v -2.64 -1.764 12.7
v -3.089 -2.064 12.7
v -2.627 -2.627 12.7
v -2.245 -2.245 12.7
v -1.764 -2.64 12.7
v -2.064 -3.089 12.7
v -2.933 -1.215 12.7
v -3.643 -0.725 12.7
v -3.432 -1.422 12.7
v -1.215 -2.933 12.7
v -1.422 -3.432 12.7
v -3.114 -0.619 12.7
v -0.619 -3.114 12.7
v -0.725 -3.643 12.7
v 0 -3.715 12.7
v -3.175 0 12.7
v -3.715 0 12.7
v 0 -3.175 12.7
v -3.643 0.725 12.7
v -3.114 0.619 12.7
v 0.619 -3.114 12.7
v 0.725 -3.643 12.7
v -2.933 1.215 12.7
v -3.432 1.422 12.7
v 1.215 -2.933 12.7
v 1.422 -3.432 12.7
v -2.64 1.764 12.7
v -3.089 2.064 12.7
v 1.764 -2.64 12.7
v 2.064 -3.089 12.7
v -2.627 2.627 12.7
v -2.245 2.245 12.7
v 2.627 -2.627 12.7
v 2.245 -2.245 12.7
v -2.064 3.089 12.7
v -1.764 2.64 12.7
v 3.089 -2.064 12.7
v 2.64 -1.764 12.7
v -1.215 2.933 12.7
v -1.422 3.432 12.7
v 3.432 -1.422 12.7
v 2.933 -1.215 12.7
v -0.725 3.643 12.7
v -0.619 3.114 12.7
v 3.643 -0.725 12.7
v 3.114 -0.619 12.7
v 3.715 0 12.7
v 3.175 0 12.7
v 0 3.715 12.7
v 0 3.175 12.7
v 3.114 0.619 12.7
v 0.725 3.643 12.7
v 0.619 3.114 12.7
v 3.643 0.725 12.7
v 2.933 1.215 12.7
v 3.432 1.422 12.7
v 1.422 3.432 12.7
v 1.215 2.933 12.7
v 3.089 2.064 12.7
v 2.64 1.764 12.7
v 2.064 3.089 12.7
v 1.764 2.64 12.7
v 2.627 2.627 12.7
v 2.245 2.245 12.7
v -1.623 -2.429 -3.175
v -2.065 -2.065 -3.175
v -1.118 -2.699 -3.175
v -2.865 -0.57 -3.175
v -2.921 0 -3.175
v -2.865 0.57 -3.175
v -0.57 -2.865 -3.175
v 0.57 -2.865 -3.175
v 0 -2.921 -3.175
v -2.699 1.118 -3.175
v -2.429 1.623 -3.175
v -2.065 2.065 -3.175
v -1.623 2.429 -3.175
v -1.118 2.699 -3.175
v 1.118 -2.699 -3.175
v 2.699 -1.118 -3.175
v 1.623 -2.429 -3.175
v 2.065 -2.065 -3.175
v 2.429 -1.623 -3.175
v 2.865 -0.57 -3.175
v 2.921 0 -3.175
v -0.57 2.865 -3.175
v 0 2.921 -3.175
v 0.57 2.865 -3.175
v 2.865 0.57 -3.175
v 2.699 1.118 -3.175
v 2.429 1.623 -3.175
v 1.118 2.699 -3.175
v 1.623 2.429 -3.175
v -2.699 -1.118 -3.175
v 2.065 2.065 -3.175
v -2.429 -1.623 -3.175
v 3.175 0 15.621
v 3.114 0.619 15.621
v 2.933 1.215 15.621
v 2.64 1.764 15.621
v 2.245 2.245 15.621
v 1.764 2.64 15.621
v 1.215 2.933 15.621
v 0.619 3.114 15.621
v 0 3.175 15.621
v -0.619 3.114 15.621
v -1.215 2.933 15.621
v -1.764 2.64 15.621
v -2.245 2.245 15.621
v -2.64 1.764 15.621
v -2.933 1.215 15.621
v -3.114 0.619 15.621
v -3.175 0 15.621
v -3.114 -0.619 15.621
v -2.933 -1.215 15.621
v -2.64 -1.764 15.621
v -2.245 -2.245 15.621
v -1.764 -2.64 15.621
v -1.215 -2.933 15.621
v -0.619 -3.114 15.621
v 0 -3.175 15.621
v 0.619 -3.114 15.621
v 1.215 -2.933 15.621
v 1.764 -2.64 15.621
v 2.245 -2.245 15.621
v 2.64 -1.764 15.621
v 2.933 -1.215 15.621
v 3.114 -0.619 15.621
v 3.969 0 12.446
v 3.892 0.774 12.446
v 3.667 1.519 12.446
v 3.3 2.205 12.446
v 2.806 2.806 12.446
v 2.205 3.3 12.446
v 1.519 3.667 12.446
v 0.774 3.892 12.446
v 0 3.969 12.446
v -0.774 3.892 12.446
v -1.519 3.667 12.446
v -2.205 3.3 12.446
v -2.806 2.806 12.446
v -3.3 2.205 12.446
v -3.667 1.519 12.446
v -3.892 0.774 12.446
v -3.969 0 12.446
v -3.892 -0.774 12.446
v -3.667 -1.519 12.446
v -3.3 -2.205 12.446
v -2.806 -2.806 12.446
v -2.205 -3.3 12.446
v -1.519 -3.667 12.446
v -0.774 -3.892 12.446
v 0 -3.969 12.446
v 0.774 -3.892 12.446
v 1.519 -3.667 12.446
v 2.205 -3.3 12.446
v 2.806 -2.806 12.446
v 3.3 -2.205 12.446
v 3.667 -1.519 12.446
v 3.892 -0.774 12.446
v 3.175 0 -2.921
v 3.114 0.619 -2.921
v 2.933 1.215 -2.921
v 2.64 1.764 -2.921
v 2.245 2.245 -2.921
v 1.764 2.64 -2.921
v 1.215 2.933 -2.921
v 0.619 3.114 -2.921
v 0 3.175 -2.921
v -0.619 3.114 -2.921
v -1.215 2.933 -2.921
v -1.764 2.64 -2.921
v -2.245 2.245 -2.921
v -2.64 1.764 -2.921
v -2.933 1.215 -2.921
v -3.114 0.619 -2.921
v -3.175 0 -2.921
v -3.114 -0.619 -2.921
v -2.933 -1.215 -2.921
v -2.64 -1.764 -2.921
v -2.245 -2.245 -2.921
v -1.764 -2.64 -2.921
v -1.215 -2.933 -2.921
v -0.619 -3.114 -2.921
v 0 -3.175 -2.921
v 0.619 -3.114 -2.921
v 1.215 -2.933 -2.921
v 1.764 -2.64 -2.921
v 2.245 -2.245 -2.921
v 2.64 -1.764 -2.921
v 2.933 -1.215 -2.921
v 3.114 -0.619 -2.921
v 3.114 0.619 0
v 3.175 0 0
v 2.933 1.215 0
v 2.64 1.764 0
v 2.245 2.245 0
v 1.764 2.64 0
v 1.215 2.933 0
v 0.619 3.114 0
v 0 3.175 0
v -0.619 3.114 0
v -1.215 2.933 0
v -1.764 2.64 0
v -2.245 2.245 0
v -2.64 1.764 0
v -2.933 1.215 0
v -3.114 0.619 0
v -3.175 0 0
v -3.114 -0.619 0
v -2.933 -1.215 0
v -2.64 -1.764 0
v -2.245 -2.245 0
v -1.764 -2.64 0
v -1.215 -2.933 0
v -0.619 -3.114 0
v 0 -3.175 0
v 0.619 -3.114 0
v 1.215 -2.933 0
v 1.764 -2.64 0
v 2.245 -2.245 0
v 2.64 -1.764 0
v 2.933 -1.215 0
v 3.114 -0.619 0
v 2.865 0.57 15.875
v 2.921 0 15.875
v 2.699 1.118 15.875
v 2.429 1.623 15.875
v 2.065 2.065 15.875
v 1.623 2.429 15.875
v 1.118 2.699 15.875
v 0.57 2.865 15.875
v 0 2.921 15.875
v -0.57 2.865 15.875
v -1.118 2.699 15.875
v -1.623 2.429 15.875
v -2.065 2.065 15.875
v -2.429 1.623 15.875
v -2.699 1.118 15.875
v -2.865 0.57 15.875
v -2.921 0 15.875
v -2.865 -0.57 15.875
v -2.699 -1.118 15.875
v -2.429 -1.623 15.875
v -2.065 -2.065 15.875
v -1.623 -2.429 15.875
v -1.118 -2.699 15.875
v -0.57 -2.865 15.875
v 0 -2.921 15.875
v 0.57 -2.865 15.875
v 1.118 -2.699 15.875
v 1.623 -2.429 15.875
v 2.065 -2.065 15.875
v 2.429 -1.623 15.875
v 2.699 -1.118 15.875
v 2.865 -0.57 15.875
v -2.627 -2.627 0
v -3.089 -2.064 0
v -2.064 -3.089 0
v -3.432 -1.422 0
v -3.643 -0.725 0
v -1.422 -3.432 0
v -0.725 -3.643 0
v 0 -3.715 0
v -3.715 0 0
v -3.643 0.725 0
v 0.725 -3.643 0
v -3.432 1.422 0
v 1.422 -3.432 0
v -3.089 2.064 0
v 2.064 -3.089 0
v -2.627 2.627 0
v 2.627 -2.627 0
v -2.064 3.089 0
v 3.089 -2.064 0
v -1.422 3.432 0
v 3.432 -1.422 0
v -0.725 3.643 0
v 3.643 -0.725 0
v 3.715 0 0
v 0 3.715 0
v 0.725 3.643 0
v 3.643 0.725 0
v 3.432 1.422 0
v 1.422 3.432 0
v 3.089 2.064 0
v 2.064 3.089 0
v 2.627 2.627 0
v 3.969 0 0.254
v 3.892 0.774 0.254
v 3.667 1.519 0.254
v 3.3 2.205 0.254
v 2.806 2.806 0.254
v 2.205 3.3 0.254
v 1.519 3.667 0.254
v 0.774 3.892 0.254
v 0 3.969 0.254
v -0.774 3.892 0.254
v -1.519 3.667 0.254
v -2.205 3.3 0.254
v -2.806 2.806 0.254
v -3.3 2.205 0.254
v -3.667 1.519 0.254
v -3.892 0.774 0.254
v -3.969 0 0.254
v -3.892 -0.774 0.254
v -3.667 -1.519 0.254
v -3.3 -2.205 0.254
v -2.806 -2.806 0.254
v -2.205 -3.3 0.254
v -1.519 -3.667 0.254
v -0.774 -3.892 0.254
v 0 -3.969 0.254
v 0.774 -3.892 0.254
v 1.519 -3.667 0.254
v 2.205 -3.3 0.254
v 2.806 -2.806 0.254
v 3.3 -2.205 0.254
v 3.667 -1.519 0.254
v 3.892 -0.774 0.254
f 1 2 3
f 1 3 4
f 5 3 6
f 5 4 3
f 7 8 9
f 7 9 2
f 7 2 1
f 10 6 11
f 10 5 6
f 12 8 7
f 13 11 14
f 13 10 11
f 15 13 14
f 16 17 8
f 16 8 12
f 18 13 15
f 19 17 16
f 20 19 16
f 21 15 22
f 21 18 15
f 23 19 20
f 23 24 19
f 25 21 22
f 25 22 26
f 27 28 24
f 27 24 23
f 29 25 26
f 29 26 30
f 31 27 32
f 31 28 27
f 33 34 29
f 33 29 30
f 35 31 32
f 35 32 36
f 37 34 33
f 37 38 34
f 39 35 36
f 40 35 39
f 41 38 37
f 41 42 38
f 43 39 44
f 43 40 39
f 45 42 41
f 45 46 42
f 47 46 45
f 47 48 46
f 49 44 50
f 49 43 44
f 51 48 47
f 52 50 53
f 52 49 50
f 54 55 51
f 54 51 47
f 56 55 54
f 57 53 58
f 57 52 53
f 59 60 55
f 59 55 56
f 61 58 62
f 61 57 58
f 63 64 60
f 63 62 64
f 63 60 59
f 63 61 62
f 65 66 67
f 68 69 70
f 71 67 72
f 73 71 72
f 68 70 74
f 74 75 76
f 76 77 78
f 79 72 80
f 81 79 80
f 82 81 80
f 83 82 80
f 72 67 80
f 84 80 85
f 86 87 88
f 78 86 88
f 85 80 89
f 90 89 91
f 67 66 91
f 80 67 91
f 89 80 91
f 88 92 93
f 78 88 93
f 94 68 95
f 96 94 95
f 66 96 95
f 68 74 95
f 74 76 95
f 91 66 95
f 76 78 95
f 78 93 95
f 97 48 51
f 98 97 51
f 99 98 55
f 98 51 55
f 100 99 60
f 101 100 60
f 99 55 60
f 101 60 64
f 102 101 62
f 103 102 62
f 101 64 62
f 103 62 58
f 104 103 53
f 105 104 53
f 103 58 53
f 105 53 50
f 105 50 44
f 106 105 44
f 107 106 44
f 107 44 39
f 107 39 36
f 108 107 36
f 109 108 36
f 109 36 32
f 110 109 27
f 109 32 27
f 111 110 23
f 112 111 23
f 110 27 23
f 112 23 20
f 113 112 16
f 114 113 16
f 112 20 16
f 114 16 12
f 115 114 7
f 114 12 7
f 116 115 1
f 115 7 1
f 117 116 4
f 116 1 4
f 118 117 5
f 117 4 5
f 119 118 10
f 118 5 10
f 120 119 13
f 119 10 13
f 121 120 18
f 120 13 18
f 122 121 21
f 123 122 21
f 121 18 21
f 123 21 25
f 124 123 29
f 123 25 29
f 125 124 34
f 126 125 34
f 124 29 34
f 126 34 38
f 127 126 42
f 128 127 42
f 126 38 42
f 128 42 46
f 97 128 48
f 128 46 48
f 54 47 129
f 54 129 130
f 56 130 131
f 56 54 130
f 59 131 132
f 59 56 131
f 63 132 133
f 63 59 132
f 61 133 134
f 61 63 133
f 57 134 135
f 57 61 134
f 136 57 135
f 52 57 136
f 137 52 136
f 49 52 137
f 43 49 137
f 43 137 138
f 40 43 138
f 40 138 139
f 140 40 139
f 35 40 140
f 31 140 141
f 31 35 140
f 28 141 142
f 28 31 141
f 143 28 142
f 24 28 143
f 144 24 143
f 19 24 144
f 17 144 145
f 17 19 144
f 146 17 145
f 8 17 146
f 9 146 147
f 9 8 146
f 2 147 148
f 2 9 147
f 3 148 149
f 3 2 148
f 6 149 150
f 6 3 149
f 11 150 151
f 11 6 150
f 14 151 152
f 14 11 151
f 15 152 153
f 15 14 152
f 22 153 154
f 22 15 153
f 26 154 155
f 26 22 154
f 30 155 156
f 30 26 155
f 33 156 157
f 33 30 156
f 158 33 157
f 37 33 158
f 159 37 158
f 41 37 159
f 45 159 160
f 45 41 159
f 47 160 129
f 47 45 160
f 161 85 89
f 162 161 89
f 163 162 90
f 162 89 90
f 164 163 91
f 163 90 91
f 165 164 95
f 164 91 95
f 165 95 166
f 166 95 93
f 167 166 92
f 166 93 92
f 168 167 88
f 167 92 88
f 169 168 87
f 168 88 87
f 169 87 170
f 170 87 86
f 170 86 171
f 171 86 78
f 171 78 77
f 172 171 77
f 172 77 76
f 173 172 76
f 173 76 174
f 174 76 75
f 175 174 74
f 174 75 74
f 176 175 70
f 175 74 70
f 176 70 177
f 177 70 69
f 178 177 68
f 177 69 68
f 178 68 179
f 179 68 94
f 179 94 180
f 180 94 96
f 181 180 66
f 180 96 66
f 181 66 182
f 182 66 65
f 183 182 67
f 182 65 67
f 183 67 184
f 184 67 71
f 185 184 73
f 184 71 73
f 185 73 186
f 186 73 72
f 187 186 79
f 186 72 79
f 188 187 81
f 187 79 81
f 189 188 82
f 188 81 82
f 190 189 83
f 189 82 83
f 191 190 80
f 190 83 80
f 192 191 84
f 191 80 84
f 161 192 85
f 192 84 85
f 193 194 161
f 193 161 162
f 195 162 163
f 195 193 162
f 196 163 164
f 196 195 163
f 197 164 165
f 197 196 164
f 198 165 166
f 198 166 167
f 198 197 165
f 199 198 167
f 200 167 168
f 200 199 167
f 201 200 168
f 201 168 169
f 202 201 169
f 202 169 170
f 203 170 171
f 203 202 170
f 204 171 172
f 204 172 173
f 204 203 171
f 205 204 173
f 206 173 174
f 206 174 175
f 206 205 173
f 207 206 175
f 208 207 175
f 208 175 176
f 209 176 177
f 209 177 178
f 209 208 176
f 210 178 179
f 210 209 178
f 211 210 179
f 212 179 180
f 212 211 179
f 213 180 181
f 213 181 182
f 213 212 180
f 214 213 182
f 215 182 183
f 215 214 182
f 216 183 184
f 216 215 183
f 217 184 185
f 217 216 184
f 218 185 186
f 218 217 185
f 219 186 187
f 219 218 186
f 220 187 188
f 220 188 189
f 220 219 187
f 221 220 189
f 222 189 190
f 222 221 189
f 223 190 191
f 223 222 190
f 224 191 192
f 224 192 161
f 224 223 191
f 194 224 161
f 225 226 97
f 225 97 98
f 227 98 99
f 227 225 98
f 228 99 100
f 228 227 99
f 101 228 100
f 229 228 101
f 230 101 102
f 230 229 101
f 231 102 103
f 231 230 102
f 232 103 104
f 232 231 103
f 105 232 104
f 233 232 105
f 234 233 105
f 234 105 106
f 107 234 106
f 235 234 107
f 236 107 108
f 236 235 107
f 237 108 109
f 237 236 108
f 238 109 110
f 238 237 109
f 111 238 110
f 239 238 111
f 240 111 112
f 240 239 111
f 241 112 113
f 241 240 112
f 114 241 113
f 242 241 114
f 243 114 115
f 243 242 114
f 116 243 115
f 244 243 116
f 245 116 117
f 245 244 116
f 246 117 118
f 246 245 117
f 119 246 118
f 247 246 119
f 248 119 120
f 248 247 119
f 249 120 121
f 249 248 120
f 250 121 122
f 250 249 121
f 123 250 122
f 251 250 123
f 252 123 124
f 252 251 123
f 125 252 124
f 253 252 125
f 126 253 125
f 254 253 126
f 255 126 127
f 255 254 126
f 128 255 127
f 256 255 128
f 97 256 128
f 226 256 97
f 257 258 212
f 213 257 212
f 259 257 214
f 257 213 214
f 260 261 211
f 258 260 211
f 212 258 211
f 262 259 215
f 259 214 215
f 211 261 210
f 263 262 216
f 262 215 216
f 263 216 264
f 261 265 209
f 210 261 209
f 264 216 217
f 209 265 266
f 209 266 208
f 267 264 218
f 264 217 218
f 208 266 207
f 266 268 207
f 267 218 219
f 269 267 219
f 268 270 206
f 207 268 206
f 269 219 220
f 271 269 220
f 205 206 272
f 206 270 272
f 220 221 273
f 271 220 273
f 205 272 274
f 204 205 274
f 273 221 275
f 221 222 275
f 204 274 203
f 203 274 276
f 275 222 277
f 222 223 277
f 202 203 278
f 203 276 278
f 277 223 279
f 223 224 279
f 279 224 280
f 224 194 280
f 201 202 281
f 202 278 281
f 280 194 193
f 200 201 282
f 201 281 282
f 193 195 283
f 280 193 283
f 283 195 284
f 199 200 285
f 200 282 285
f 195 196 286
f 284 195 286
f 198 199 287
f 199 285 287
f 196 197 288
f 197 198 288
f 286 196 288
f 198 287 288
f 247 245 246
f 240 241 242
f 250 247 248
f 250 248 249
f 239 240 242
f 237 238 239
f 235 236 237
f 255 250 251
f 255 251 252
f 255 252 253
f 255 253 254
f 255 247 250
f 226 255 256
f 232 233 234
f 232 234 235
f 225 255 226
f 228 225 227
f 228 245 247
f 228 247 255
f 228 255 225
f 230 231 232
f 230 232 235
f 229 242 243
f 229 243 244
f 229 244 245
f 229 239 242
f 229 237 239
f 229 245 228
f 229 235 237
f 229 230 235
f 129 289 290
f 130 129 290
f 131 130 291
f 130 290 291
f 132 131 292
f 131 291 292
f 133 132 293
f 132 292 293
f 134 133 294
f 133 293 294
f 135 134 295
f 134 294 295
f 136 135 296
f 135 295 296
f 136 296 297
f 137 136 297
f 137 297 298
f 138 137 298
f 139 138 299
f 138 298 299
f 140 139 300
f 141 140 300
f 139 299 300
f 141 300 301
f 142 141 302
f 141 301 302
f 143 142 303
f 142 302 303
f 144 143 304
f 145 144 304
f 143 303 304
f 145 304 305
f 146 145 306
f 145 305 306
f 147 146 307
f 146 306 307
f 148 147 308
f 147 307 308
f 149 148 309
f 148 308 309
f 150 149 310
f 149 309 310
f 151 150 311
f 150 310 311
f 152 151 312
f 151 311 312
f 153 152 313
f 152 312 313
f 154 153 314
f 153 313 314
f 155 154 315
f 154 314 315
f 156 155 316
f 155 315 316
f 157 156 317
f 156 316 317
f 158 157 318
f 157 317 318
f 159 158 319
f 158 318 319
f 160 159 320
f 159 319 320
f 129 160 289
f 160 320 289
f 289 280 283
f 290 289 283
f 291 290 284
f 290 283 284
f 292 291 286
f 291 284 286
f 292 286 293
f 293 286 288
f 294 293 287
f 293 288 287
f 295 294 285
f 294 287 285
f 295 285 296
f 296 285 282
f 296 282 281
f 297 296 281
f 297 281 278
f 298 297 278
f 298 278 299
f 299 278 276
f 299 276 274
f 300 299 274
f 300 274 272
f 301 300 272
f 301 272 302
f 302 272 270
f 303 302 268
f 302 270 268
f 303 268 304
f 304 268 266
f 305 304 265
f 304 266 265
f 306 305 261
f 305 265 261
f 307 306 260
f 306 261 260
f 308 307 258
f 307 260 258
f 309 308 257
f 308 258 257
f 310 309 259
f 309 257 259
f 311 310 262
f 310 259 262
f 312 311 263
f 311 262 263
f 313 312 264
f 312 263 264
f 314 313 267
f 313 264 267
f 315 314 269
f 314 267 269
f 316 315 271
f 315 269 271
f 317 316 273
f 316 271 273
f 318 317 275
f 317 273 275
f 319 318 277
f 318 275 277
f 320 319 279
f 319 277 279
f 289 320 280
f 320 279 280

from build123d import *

# Parameters (mm, degrees)
F0_R     = 3.96875
F1_DEPTH = 12.7
F2_R     = 3.175
F3_DEPTH = 3.175
F4_R     = 3.175
F5_DEPTH = 3.175
F6_SIZE  = 0.254


with BuildPart() as f1:
    # F0 (on Top) → F1 (new body)
    with BuildSketch(Plane.XY):
        Circle(F0_R)
    extrude(amount=F1_DEPTH)

    # F2 (on Top) → F3 (join)
    with BuildSketch(Plane.XY):
        Circle(F2_R)
    extrude(amount=-F3_DEPTH)

    # F4 (on face) → F5 (join)
    with BuildSketch(Plane.XY.offset(12.7)):
        Circle(F4_R)
    extrude(amount=F5_DEPTH)

    # F6
    f6_edges = [f1.edges().sort_by_distance(p)[0] for p in [
        (-3.175, 0, 15.875),
        (-3.96875, 0, 12.7),
        (-3.96875, 0, 0),
        (-3.175, 0, -3.175),
    ]]
    chamfer(f6_edges, length=F6_SIZE)


solid = f1.part
